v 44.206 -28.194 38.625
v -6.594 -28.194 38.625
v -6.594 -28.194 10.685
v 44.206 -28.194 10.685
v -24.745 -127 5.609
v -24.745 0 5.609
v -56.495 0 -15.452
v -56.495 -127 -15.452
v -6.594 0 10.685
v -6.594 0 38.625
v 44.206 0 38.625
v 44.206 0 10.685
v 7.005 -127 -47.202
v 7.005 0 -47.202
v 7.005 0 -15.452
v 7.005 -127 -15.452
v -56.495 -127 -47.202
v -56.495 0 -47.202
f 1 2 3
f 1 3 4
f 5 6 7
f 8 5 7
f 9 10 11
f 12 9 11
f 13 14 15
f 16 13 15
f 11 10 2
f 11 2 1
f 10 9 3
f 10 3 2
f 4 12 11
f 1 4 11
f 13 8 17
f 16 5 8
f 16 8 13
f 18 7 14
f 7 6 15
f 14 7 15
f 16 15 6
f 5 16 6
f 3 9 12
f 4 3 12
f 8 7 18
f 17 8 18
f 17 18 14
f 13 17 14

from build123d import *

# Parameters (mm, degrees)
F0_W     = 50.8
F0_H     = 27.94
F1_DEPTH = 28.194
F3_DEPTH = 127


with BuildPart() as f1:
    # F0 (on Front) → F1 (new body)
    with BuildSketch(Plane.XZ):
        with Locations((18.806474, 24.654712)):
            Rectangle(F0_W, F0_H)
    extrude(amount=F1_DEPTH)


with BuildPart() as f3:
    # F2 (on Front) → F3 (new body)
    with BuildSketch(Plane.XZ):
        Polygon((-56.495364, -15.45193), (-56.495364, -47.20193), (7.004636, -47.20193), (7.004636, -15.45193), (-24.745364, 5.608638), align=None)
    extrude(amount=F3_DEPTH)


solid = Compound([f1.part, f3.part])
